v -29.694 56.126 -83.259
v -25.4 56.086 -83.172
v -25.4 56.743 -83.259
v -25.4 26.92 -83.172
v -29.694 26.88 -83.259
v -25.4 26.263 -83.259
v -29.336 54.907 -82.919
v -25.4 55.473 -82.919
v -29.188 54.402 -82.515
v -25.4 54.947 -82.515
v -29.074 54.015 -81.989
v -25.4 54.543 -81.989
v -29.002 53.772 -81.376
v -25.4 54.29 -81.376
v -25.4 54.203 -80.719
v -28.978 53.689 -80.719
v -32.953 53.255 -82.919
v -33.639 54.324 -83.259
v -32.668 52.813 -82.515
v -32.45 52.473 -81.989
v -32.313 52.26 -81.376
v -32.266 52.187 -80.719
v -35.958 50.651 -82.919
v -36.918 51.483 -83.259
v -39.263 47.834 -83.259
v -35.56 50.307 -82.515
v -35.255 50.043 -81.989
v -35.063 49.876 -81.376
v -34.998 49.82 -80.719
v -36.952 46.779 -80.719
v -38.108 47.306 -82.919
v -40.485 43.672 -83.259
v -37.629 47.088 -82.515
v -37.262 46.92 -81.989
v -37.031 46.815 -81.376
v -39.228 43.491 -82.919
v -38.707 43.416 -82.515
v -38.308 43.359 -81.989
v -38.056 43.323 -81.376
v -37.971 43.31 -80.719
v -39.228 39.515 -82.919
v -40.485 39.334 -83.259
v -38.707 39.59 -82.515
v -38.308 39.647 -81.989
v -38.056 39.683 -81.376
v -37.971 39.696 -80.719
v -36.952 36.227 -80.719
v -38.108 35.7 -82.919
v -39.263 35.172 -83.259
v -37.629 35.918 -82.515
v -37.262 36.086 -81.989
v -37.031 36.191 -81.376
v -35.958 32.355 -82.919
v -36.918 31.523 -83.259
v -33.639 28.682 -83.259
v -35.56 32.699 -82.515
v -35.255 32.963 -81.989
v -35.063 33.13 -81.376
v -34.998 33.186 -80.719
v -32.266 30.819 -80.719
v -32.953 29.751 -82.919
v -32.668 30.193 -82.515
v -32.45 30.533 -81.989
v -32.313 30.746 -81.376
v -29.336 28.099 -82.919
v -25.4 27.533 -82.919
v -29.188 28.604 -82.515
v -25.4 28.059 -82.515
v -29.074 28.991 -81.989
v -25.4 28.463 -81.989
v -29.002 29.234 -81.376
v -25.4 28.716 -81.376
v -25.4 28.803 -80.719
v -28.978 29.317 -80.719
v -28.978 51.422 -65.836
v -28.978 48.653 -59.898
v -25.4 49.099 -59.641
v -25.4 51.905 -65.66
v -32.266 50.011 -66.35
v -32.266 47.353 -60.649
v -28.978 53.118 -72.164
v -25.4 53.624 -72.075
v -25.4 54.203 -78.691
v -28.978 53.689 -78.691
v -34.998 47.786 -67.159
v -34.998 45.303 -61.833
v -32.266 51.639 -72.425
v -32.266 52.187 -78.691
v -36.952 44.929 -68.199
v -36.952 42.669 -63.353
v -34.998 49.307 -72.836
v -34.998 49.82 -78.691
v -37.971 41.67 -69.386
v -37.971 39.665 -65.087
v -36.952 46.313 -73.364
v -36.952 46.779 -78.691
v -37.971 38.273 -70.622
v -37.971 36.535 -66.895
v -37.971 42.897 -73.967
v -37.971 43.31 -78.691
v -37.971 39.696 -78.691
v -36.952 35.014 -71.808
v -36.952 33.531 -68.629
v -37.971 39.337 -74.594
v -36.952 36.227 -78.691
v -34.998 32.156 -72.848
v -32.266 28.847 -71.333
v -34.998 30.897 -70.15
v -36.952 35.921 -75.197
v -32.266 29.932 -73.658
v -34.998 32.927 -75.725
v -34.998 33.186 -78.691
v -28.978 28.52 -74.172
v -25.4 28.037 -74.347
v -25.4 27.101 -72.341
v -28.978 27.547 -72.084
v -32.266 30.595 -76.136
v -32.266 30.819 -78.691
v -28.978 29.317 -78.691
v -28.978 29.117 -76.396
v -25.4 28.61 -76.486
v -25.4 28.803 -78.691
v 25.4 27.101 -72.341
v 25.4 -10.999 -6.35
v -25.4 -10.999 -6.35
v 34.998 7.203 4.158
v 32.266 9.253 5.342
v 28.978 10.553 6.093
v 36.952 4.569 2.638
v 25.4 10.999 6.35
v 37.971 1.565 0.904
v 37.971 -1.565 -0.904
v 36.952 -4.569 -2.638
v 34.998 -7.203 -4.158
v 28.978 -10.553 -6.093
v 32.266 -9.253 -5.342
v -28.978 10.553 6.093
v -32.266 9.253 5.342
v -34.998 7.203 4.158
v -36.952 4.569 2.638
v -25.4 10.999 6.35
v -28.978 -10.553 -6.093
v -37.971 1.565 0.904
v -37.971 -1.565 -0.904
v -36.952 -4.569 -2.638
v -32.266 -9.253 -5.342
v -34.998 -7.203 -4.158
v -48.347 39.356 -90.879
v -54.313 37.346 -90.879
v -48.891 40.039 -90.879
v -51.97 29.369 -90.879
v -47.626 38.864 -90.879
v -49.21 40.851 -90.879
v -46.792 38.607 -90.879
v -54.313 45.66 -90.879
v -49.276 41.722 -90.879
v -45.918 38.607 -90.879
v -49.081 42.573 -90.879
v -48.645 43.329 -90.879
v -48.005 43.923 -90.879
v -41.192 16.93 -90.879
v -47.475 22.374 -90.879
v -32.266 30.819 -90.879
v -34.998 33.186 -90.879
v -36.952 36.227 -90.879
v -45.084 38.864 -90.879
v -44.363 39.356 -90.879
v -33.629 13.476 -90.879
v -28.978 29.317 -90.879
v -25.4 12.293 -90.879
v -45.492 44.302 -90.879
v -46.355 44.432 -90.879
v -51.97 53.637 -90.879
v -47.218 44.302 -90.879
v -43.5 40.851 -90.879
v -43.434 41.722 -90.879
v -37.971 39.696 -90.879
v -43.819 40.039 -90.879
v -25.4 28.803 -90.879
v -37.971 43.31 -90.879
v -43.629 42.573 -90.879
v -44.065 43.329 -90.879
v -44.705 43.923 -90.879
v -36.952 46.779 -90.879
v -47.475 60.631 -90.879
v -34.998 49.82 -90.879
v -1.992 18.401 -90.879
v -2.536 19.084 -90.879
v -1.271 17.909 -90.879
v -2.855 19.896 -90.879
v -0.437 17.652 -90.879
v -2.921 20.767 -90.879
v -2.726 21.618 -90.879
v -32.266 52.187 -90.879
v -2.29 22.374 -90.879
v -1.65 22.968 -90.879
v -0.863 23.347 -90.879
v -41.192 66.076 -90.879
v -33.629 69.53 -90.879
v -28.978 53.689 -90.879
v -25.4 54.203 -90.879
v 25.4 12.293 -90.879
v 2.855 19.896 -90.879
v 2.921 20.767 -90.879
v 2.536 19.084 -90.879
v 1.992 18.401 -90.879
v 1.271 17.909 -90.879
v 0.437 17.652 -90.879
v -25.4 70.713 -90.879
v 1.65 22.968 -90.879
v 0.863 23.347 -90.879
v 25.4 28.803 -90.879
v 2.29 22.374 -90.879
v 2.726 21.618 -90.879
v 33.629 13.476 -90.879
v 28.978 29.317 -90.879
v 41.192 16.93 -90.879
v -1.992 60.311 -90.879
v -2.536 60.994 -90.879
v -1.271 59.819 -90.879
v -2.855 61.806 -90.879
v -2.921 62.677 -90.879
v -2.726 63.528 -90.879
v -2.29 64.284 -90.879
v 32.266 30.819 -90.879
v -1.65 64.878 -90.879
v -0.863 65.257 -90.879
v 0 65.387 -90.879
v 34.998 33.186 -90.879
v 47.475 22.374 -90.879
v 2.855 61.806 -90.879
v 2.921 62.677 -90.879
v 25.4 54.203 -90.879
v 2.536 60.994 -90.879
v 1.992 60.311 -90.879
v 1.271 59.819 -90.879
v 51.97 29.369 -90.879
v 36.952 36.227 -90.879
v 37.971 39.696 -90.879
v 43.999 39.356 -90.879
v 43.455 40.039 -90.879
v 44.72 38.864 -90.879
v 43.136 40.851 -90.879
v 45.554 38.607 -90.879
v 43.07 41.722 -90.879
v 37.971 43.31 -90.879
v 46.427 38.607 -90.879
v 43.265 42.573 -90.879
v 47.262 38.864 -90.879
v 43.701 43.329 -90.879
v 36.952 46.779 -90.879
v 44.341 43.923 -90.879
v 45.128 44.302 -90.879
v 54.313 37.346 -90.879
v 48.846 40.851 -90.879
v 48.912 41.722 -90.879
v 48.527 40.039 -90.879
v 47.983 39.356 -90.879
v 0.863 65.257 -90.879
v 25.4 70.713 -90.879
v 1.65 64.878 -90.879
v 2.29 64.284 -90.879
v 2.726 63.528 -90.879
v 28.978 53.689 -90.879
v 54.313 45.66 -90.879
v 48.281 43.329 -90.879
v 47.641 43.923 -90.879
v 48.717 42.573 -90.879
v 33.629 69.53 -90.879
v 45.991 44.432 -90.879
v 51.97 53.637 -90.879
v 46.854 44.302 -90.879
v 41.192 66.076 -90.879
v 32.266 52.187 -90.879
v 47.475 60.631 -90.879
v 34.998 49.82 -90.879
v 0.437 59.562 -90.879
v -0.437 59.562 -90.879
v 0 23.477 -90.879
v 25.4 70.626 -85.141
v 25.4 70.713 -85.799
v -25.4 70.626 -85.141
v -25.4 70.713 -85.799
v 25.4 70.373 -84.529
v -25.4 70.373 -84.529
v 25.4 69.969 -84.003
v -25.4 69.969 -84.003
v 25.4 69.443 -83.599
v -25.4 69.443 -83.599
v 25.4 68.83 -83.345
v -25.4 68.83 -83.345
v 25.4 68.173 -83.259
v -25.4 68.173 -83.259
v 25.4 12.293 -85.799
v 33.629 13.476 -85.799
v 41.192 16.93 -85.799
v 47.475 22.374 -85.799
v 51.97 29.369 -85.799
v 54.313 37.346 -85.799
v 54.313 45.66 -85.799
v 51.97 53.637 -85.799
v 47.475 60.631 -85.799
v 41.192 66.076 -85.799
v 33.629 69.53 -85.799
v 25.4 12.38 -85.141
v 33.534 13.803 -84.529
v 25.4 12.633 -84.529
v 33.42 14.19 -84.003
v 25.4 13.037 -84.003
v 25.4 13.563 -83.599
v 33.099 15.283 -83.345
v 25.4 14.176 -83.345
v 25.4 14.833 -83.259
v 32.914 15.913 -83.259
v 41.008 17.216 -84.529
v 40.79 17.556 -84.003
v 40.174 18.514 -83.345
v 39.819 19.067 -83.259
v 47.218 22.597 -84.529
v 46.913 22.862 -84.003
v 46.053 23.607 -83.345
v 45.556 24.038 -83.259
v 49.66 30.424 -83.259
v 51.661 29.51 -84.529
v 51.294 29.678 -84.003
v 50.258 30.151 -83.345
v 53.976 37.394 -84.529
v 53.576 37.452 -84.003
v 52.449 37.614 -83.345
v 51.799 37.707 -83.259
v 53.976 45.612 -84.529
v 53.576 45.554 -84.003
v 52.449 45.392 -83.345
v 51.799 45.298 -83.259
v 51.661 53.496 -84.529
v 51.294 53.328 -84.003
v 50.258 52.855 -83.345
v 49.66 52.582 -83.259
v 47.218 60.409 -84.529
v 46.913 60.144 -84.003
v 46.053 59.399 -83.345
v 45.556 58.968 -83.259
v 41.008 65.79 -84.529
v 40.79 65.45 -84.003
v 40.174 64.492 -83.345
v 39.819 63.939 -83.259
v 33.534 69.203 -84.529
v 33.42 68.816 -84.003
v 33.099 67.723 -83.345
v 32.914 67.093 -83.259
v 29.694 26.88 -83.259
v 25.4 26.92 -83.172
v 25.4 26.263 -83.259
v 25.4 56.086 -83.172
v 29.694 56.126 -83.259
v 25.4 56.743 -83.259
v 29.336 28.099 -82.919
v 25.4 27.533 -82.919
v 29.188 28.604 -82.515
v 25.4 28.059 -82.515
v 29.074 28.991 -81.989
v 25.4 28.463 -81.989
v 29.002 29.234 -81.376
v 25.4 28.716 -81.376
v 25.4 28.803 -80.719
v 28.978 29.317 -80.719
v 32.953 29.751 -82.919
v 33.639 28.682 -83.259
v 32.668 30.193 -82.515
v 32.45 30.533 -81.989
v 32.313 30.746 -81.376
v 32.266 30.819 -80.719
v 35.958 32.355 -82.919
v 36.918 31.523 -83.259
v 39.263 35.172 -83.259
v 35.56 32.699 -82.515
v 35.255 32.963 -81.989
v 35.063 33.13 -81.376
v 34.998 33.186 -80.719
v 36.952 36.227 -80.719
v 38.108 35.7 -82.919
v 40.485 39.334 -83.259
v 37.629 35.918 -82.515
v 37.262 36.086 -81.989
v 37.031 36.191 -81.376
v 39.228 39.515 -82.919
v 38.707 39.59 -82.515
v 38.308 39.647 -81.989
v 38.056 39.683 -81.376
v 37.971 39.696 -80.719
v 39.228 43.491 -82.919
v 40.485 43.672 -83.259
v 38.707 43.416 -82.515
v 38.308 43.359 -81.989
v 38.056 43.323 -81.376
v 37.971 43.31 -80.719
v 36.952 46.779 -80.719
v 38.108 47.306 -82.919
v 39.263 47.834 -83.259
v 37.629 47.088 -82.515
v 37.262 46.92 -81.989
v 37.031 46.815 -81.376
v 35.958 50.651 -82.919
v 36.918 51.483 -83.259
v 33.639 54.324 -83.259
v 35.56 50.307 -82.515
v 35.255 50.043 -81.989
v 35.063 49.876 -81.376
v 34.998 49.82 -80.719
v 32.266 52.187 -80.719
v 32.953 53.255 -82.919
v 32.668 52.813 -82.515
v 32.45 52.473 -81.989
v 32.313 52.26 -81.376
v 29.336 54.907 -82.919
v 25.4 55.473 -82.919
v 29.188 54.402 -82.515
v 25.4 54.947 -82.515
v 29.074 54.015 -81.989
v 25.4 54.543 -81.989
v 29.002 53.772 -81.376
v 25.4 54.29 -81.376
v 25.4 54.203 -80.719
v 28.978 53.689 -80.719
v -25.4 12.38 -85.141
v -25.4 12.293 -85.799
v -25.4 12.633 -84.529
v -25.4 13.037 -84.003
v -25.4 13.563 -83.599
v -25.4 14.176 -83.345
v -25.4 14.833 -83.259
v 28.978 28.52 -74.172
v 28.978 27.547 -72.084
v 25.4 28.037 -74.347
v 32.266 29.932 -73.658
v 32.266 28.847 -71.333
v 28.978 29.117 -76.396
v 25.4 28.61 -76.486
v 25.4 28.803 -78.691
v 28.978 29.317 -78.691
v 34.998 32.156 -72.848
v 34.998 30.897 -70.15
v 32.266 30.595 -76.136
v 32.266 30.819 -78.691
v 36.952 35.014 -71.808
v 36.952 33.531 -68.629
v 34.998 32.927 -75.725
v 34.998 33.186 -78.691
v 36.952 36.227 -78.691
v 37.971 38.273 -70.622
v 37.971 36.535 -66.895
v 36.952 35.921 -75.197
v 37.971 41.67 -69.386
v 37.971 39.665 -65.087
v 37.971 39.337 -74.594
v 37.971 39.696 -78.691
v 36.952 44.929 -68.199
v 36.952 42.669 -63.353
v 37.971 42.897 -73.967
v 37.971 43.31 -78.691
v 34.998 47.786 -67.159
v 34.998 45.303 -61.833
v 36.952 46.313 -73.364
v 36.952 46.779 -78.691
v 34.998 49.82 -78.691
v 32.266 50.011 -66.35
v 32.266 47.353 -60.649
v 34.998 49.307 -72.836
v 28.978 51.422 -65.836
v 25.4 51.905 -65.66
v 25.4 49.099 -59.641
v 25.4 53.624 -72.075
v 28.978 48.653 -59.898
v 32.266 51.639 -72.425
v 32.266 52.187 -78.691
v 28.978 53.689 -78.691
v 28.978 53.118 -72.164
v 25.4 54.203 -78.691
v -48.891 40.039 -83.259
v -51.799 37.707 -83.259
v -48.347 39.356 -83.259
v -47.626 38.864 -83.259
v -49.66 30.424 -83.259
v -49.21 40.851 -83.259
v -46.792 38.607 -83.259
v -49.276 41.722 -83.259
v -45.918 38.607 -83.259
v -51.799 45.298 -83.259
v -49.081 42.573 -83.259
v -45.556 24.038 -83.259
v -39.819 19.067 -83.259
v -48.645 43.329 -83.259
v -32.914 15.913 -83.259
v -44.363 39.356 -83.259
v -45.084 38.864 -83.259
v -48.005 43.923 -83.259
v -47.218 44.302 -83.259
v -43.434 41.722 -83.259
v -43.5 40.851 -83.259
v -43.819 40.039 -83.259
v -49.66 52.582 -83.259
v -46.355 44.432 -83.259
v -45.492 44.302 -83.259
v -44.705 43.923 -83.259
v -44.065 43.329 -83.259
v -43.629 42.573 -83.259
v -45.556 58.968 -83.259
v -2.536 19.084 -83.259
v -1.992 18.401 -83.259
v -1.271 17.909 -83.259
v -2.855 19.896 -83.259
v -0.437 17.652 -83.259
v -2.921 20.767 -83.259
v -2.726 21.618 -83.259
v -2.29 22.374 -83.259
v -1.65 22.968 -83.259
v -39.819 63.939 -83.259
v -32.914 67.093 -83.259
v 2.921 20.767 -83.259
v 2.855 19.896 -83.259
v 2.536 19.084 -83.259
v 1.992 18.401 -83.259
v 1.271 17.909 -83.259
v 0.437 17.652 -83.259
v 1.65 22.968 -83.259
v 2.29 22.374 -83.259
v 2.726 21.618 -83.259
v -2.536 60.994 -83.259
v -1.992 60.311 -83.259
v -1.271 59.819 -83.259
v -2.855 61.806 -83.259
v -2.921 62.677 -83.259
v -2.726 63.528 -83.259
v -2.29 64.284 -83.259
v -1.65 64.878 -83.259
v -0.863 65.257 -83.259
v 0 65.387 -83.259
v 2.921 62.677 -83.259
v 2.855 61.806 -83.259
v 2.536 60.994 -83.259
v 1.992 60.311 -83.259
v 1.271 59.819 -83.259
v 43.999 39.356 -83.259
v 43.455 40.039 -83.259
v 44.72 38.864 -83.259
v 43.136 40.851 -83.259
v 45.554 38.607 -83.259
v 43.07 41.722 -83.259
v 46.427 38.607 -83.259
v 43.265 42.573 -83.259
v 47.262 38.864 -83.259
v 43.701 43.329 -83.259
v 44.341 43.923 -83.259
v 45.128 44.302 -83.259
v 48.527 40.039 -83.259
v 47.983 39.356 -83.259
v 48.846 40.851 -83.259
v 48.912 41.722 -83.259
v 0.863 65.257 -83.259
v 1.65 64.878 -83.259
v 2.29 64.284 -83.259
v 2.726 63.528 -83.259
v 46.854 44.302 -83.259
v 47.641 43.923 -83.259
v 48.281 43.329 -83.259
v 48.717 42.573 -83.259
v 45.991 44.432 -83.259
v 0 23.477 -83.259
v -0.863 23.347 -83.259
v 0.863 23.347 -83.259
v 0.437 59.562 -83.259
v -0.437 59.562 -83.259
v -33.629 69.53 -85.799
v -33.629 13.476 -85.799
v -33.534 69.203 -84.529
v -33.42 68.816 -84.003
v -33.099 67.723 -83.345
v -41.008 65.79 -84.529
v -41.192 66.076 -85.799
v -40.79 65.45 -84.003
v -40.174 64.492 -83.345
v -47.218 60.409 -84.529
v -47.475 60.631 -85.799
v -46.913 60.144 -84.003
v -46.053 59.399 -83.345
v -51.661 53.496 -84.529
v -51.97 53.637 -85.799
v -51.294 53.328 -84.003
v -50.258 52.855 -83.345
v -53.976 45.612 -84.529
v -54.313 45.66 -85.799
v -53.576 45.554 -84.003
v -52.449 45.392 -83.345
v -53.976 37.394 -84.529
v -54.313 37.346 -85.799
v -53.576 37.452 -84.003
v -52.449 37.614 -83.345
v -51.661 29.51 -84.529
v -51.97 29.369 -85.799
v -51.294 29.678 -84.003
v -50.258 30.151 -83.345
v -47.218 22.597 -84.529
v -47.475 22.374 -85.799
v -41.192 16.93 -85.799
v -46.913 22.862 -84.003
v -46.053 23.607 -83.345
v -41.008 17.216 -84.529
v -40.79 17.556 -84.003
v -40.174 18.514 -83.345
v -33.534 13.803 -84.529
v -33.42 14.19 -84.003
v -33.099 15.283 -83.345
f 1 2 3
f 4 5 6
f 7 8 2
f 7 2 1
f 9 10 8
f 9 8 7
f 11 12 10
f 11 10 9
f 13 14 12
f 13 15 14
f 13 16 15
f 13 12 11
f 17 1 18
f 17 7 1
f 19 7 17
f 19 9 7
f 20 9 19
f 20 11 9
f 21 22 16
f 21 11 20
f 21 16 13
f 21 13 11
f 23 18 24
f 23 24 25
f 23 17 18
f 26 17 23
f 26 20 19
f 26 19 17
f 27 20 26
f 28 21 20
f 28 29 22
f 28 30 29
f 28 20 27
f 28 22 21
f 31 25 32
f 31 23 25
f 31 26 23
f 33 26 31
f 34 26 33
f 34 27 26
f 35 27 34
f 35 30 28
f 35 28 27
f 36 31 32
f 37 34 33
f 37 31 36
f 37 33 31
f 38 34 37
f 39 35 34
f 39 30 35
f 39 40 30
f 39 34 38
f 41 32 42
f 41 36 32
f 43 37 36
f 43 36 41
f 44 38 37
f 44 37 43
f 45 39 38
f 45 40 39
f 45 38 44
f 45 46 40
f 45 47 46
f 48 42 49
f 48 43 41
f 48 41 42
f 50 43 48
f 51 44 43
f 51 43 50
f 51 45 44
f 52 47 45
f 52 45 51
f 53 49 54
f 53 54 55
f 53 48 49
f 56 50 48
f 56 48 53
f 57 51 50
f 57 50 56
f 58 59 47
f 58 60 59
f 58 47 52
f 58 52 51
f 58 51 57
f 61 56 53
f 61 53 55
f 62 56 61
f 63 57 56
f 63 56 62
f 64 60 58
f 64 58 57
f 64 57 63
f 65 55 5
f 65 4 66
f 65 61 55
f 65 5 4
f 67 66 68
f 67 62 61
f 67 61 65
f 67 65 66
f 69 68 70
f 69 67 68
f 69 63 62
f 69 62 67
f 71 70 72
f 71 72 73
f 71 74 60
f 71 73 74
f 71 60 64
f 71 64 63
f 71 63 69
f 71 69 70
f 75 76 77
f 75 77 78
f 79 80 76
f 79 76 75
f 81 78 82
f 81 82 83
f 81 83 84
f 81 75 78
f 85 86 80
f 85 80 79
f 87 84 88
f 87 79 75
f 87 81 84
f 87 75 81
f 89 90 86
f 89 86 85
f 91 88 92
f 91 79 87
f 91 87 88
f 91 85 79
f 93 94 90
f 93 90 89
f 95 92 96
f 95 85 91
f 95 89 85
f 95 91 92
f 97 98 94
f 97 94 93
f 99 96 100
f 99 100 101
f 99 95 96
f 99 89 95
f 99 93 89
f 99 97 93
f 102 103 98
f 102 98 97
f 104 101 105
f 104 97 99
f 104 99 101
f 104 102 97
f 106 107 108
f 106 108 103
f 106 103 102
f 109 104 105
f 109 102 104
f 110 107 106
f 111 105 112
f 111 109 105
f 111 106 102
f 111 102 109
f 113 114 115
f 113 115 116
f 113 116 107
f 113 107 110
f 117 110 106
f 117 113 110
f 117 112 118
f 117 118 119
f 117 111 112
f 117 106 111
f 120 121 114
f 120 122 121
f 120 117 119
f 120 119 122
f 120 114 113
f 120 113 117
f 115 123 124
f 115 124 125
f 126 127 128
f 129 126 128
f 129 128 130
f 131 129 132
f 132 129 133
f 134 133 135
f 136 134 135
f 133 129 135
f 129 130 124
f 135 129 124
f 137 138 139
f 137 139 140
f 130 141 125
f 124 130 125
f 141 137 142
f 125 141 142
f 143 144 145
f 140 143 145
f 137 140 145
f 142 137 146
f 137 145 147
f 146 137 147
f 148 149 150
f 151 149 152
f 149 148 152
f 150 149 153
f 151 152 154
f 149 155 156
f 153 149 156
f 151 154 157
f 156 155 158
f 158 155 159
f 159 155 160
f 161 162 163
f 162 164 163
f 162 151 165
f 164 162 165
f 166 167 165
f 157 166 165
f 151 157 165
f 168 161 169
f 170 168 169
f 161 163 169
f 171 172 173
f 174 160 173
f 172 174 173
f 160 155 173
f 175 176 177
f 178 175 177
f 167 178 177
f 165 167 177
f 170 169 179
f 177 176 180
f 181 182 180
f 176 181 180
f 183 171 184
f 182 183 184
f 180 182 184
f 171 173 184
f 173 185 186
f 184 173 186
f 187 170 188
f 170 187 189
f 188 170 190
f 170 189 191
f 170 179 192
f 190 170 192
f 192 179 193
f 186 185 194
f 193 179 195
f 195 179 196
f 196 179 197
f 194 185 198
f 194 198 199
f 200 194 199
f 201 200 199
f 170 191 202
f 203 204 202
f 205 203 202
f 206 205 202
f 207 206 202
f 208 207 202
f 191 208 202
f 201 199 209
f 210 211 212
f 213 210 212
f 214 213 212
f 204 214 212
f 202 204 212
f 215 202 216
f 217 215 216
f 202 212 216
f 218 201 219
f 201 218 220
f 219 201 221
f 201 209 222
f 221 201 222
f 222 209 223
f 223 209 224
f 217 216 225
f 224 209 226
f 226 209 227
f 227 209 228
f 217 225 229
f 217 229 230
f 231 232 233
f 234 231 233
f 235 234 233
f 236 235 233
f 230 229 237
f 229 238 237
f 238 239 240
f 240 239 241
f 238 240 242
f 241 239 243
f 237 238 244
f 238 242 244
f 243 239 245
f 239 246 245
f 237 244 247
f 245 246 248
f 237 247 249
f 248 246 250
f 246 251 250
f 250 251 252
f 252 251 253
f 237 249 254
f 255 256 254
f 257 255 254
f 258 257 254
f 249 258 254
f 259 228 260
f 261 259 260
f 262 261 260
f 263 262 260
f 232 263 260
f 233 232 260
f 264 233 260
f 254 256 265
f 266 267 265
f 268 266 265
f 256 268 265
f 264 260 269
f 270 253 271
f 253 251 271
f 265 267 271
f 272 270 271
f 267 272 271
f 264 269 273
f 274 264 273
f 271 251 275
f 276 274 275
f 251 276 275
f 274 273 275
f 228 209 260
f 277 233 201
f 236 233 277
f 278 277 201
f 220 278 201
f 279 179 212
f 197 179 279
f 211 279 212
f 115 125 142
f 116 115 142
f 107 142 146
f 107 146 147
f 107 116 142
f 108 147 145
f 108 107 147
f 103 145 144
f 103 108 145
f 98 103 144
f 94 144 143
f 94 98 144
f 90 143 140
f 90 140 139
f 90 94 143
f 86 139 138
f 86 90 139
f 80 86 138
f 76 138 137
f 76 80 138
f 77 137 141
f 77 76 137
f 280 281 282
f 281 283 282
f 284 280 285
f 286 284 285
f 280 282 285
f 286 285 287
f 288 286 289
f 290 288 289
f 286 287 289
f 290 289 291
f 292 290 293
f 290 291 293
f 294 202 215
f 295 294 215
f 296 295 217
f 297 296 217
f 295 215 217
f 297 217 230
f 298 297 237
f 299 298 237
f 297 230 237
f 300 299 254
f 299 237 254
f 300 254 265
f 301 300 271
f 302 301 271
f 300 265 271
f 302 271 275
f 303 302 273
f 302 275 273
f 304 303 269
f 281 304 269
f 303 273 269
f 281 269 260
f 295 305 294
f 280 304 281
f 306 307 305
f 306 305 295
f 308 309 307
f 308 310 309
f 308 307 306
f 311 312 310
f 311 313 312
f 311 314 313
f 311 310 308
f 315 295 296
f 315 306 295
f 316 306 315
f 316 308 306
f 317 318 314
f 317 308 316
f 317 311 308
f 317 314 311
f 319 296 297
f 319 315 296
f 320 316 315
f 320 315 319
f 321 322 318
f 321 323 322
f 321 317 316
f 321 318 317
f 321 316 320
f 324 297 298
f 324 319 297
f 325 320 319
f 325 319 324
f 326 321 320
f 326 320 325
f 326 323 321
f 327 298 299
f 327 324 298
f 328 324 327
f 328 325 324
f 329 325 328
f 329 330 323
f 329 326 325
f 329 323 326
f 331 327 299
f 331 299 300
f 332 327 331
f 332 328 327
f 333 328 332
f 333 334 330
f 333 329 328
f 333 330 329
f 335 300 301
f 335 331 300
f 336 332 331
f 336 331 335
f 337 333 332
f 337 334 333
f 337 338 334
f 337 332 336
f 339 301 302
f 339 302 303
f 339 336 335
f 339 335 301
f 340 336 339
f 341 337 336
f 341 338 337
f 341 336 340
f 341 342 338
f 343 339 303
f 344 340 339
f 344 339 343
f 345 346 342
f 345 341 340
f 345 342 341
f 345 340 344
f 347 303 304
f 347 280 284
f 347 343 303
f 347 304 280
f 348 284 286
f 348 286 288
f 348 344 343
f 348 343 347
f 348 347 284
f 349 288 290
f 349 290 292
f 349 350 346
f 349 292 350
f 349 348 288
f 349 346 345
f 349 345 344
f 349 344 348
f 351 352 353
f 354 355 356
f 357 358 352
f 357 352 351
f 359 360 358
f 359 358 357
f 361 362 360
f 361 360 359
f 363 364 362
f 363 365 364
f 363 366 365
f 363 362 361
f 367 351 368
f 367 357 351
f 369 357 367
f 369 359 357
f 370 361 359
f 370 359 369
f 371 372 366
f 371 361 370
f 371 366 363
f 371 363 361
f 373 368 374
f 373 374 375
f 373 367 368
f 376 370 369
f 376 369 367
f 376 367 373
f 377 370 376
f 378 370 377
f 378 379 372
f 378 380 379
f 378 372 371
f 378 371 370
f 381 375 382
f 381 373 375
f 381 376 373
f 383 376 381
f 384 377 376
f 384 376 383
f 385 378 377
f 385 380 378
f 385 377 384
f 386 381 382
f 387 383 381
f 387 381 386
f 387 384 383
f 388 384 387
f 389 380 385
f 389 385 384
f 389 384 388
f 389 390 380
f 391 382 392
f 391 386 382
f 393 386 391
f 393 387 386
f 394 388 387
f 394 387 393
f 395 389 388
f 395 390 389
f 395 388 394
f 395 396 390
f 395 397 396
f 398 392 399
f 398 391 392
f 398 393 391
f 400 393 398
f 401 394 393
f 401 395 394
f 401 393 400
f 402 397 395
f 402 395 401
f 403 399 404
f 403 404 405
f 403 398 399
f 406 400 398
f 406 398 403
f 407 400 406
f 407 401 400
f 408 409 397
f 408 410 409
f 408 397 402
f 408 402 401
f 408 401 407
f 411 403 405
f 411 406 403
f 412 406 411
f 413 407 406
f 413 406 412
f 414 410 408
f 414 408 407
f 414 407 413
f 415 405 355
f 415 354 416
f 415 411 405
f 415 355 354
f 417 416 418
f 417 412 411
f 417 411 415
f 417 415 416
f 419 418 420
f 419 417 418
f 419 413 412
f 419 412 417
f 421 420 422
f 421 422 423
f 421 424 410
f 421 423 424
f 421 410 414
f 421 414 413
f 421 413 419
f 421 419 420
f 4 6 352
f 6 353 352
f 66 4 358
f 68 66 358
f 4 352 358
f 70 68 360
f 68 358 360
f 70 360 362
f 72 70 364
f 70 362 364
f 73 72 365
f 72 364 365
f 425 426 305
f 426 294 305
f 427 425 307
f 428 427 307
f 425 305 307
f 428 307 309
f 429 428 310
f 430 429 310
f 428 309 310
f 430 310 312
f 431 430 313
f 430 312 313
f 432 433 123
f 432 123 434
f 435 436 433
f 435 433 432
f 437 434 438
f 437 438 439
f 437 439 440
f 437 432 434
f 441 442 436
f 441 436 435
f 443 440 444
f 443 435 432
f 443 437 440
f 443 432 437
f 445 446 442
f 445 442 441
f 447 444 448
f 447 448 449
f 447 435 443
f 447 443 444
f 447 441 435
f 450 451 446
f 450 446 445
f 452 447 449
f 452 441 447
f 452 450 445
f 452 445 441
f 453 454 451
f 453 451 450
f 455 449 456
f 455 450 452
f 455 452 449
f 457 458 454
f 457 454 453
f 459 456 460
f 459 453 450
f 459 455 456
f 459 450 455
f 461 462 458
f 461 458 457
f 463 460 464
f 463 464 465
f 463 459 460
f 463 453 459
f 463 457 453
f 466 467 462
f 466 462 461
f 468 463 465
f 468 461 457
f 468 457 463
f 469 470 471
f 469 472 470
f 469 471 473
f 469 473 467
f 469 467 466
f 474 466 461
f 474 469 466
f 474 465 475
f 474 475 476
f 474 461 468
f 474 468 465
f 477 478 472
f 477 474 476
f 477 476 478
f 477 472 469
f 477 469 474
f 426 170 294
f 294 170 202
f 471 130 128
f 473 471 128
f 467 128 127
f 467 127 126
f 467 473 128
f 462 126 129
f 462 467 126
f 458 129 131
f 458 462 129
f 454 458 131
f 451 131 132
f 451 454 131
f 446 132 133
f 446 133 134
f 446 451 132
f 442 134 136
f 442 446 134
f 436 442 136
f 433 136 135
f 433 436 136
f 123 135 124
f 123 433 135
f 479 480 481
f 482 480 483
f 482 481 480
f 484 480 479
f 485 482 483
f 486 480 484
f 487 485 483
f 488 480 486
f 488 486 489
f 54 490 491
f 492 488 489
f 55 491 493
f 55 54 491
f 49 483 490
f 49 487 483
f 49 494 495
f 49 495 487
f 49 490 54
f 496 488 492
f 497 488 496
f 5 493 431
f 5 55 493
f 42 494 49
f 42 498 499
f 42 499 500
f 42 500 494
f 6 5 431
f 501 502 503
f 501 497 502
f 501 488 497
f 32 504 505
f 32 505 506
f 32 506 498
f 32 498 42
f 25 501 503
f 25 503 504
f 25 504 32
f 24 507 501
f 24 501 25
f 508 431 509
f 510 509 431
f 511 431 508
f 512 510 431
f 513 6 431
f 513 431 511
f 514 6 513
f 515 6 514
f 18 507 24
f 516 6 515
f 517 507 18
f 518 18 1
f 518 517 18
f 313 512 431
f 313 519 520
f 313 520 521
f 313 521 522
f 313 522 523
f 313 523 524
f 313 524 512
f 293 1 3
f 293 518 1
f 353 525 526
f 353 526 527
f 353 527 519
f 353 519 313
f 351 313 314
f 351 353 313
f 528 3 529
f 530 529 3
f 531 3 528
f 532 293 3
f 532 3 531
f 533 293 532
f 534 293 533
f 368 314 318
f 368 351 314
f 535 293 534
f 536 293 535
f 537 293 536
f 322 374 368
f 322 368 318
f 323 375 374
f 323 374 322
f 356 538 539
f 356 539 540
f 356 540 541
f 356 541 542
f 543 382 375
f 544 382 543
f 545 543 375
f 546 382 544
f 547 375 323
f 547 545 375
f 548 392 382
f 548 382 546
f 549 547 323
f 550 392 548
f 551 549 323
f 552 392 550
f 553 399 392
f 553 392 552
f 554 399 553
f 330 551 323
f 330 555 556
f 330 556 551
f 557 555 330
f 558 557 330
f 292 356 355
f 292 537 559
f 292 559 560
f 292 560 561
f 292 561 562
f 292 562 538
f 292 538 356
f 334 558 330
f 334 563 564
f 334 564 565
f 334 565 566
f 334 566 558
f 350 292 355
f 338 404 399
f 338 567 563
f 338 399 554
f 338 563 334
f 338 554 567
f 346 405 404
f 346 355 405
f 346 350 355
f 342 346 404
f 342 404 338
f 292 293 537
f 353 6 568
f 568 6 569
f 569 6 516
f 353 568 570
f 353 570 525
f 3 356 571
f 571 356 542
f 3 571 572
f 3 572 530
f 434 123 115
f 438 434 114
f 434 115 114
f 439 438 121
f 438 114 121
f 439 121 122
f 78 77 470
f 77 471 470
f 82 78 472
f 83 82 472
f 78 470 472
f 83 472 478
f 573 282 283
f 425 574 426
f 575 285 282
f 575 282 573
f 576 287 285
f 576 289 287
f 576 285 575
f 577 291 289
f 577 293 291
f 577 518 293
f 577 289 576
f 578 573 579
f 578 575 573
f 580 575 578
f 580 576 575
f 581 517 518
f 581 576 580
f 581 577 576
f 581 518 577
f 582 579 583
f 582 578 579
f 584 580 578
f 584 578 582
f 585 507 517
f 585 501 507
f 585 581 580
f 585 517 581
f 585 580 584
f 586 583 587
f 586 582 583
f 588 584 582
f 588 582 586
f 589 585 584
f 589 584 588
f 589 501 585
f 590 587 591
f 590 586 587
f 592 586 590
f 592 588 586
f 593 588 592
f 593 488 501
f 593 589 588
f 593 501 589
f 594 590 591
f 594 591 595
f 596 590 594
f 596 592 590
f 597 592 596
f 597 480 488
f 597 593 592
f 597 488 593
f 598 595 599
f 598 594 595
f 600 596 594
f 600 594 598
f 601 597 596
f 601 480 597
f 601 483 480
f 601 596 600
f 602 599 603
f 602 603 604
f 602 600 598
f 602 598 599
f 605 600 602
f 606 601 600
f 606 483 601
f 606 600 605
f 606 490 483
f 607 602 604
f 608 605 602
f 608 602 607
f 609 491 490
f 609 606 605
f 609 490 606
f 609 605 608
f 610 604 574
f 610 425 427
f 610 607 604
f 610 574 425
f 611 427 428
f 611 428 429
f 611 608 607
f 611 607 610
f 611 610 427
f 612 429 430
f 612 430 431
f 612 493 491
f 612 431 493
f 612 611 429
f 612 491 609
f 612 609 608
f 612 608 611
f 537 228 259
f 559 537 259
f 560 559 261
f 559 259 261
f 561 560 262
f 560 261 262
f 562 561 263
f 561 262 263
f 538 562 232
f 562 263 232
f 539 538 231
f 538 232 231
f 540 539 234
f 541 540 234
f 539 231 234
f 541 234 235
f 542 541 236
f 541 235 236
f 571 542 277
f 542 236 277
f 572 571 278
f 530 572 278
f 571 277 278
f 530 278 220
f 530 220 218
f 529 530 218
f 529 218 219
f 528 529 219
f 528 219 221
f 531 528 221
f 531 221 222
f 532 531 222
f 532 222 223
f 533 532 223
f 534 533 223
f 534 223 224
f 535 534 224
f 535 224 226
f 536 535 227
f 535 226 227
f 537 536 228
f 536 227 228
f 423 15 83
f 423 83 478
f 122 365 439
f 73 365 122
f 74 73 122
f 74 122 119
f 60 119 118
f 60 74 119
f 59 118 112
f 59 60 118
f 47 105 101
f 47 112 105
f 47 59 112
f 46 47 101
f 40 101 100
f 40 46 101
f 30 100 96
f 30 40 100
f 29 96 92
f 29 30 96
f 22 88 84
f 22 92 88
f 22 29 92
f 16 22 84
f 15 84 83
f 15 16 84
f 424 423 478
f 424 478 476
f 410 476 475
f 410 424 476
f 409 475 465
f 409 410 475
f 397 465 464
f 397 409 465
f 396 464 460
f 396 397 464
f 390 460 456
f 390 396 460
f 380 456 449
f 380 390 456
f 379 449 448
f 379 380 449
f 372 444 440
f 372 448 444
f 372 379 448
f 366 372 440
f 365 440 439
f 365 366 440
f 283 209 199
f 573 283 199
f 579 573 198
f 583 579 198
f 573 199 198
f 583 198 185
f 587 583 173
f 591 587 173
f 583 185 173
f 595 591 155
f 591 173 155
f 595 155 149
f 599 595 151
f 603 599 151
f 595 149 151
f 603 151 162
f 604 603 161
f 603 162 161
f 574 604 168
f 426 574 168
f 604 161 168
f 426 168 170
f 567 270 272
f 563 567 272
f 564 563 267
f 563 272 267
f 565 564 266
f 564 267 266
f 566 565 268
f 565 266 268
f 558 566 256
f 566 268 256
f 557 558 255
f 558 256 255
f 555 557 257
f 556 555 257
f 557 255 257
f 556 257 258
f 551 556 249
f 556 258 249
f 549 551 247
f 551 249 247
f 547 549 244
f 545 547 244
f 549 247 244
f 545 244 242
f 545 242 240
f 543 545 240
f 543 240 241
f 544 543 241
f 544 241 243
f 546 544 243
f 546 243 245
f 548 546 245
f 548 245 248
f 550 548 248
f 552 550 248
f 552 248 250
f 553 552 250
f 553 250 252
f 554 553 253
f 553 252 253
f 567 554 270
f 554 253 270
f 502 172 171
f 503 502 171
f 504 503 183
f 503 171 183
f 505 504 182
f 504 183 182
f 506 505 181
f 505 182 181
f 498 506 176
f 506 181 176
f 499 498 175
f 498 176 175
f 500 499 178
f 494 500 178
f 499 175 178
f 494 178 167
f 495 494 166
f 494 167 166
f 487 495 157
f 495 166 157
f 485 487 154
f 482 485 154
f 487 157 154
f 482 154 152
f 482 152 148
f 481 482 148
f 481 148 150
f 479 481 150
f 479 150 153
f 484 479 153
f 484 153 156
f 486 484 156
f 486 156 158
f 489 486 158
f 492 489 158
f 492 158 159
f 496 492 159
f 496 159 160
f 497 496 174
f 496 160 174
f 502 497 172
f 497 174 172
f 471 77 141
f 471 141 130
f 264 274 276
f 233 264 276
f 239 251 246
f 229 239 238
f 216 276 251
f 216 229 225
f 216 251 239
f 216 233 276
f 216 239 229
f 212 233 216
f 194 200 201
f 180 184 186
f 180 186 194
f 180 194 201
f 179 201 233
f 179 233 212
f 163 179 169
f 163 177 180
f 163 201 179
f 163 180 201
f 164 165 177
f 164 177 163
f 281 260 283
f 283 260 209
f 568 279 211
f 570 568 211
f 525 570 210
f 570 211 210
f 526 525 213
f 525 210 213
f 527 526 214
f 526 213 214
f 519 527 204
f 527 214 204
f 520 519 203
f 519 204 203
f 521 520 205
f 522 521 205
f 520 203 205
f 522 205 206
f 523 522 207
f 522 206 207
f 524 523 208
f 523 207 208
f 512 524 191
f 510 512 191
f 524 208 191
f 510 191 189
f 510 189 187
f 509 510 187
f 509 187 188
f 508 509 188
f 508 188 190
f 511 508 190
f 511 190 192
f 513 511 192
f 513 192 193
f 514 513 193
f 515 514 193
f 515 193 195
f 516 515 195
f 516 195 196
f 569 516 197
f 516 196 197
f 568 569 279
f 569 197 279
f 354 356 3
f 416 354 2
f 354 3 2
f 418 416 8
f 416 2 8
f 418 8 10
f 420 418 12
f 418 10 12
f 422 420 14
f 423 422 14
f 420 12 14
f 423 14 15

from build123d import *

# Parameters (mm, degrees)
SKETCH9_R      = 2.928820999
EXTRUDE2_DEPTH = 7.62
FILLET3_R      = 2.54


with BuildPart() as part:
    # Sweep5: sweep along a path in Sketch1
    with BuildLine(Plane(origin=(0, 0, 0), x_dir=(0, 0, -1), z_dir=(1, 0, 0))) as sweep5_path:
        Line((0, 0), (65.991135768, 38.1))
        ThreePointArc((65.991135768, 38.1), (72.117132023, 40.637470732), (78.691135768, 41.502954744))
        Line((78.691135768, 41.502954744), (90.878802907, 41.502954744))
    # Sketch2 → Sweep5 (sweep)
    with BuildSketch(Plane(origin=(0, 0, 0), x_dir=(-1, 0, 0), z_dir=(0, 0.5000000000000013, -0.8660254037844379))):
        with BuildLine():
            Line((-25.4, 12.7), (25.4, 12.7))
            ThreePointArc((25.4, 12.7), (38.1, 0), (25.4, -12.7))
            Line((25.4, -12.7), (-25.4, -12.7))
            ThreePointArc((-25.4, -12.7), (-38.1, 0), (-25.4, 12.7))
        make_face()
    sweep(path=sweep5_path.line)

    # Sketch9 → Extrude2 (add)
    with BuildSketch(Plane(origin=(0, 0, -90.878802907), x_dir=(-1, 0, 0), z_dir=(0, 0, -1))):
        with BuildLine():
            Line((-25.4, 70.712954744), (25.4, 70.712954744))
            ThreePointArc((25.4, 70.712954744), (54.61, 41.502954744), (25.4, 12.292954744))
            Line((25.4, 12.292954744), (-25.4, 12.292954744))
            ThreePointArc((-25.4, 12.292954744), (-54.61, 41.502954744), (-25.4, 70.712954744))
        make_face()
        with Locations(Location((-45.990959388, 41.502954744, 0), (0, 0, 90))):
            Circle(SKETCH9_R, mode=Mode.SUBTRACT)
        with Locations(Location((0, 62.457954744, 0), (0, 0, 90))):
            Circle(SKETCH9_R, mode=Mode.SUBTRACT)
        with Locations(Location((46.355, 41.502954744, 0), (0, 0, 90))):
            Circle(SKETCH9_R, mode=Mode.SUBTRACT)
        with Locations(Location((0, 20.547954744, 0), (0, 0, 90))):
            Circle(SKETCH9_R, mode=Mode.SUBTRACT)
        with BuildLine():
            Line((-25.4, 54.202954744), (25.4, 54.202954744))
            ThreePointArc((25.4, 54.202954744), (38.1, 41.502954744), (25.4, 28.802954744))
            Line((25.4, 28.802954744), (-25.4, 28.802954744))
            ThreePointArc((-25.4, 28.802954744), (-38.1, 41.502954744), (-25.4, 54.202954744))
        make_face(mode=Mode.SUBTRACT)
    extrude(amount=-EXTRUDE2_DEPTH)

    # Fillet3
    fillet3_edges = [part.edges().sort_by_distance(p)[0] for p in [
        (54.61, 41.502954744, -83.258802907),
        (0, 70.712954744, -83.258802907),
        (-54.61, 41.502954744, -83.258802907),
        (0, 12.292954744, -83.258802907),
        (38.1, 41.502954744, -83.258802907),
        (0, 28.802954744, -83.258802907),
        (-38.1, 41.502954744, -83.258802907),
        (0, 54.202954744, -83.258802907),
    ]]
    fillet(fillet3_edges, radius=FILLET3_R)


solid = part.part
